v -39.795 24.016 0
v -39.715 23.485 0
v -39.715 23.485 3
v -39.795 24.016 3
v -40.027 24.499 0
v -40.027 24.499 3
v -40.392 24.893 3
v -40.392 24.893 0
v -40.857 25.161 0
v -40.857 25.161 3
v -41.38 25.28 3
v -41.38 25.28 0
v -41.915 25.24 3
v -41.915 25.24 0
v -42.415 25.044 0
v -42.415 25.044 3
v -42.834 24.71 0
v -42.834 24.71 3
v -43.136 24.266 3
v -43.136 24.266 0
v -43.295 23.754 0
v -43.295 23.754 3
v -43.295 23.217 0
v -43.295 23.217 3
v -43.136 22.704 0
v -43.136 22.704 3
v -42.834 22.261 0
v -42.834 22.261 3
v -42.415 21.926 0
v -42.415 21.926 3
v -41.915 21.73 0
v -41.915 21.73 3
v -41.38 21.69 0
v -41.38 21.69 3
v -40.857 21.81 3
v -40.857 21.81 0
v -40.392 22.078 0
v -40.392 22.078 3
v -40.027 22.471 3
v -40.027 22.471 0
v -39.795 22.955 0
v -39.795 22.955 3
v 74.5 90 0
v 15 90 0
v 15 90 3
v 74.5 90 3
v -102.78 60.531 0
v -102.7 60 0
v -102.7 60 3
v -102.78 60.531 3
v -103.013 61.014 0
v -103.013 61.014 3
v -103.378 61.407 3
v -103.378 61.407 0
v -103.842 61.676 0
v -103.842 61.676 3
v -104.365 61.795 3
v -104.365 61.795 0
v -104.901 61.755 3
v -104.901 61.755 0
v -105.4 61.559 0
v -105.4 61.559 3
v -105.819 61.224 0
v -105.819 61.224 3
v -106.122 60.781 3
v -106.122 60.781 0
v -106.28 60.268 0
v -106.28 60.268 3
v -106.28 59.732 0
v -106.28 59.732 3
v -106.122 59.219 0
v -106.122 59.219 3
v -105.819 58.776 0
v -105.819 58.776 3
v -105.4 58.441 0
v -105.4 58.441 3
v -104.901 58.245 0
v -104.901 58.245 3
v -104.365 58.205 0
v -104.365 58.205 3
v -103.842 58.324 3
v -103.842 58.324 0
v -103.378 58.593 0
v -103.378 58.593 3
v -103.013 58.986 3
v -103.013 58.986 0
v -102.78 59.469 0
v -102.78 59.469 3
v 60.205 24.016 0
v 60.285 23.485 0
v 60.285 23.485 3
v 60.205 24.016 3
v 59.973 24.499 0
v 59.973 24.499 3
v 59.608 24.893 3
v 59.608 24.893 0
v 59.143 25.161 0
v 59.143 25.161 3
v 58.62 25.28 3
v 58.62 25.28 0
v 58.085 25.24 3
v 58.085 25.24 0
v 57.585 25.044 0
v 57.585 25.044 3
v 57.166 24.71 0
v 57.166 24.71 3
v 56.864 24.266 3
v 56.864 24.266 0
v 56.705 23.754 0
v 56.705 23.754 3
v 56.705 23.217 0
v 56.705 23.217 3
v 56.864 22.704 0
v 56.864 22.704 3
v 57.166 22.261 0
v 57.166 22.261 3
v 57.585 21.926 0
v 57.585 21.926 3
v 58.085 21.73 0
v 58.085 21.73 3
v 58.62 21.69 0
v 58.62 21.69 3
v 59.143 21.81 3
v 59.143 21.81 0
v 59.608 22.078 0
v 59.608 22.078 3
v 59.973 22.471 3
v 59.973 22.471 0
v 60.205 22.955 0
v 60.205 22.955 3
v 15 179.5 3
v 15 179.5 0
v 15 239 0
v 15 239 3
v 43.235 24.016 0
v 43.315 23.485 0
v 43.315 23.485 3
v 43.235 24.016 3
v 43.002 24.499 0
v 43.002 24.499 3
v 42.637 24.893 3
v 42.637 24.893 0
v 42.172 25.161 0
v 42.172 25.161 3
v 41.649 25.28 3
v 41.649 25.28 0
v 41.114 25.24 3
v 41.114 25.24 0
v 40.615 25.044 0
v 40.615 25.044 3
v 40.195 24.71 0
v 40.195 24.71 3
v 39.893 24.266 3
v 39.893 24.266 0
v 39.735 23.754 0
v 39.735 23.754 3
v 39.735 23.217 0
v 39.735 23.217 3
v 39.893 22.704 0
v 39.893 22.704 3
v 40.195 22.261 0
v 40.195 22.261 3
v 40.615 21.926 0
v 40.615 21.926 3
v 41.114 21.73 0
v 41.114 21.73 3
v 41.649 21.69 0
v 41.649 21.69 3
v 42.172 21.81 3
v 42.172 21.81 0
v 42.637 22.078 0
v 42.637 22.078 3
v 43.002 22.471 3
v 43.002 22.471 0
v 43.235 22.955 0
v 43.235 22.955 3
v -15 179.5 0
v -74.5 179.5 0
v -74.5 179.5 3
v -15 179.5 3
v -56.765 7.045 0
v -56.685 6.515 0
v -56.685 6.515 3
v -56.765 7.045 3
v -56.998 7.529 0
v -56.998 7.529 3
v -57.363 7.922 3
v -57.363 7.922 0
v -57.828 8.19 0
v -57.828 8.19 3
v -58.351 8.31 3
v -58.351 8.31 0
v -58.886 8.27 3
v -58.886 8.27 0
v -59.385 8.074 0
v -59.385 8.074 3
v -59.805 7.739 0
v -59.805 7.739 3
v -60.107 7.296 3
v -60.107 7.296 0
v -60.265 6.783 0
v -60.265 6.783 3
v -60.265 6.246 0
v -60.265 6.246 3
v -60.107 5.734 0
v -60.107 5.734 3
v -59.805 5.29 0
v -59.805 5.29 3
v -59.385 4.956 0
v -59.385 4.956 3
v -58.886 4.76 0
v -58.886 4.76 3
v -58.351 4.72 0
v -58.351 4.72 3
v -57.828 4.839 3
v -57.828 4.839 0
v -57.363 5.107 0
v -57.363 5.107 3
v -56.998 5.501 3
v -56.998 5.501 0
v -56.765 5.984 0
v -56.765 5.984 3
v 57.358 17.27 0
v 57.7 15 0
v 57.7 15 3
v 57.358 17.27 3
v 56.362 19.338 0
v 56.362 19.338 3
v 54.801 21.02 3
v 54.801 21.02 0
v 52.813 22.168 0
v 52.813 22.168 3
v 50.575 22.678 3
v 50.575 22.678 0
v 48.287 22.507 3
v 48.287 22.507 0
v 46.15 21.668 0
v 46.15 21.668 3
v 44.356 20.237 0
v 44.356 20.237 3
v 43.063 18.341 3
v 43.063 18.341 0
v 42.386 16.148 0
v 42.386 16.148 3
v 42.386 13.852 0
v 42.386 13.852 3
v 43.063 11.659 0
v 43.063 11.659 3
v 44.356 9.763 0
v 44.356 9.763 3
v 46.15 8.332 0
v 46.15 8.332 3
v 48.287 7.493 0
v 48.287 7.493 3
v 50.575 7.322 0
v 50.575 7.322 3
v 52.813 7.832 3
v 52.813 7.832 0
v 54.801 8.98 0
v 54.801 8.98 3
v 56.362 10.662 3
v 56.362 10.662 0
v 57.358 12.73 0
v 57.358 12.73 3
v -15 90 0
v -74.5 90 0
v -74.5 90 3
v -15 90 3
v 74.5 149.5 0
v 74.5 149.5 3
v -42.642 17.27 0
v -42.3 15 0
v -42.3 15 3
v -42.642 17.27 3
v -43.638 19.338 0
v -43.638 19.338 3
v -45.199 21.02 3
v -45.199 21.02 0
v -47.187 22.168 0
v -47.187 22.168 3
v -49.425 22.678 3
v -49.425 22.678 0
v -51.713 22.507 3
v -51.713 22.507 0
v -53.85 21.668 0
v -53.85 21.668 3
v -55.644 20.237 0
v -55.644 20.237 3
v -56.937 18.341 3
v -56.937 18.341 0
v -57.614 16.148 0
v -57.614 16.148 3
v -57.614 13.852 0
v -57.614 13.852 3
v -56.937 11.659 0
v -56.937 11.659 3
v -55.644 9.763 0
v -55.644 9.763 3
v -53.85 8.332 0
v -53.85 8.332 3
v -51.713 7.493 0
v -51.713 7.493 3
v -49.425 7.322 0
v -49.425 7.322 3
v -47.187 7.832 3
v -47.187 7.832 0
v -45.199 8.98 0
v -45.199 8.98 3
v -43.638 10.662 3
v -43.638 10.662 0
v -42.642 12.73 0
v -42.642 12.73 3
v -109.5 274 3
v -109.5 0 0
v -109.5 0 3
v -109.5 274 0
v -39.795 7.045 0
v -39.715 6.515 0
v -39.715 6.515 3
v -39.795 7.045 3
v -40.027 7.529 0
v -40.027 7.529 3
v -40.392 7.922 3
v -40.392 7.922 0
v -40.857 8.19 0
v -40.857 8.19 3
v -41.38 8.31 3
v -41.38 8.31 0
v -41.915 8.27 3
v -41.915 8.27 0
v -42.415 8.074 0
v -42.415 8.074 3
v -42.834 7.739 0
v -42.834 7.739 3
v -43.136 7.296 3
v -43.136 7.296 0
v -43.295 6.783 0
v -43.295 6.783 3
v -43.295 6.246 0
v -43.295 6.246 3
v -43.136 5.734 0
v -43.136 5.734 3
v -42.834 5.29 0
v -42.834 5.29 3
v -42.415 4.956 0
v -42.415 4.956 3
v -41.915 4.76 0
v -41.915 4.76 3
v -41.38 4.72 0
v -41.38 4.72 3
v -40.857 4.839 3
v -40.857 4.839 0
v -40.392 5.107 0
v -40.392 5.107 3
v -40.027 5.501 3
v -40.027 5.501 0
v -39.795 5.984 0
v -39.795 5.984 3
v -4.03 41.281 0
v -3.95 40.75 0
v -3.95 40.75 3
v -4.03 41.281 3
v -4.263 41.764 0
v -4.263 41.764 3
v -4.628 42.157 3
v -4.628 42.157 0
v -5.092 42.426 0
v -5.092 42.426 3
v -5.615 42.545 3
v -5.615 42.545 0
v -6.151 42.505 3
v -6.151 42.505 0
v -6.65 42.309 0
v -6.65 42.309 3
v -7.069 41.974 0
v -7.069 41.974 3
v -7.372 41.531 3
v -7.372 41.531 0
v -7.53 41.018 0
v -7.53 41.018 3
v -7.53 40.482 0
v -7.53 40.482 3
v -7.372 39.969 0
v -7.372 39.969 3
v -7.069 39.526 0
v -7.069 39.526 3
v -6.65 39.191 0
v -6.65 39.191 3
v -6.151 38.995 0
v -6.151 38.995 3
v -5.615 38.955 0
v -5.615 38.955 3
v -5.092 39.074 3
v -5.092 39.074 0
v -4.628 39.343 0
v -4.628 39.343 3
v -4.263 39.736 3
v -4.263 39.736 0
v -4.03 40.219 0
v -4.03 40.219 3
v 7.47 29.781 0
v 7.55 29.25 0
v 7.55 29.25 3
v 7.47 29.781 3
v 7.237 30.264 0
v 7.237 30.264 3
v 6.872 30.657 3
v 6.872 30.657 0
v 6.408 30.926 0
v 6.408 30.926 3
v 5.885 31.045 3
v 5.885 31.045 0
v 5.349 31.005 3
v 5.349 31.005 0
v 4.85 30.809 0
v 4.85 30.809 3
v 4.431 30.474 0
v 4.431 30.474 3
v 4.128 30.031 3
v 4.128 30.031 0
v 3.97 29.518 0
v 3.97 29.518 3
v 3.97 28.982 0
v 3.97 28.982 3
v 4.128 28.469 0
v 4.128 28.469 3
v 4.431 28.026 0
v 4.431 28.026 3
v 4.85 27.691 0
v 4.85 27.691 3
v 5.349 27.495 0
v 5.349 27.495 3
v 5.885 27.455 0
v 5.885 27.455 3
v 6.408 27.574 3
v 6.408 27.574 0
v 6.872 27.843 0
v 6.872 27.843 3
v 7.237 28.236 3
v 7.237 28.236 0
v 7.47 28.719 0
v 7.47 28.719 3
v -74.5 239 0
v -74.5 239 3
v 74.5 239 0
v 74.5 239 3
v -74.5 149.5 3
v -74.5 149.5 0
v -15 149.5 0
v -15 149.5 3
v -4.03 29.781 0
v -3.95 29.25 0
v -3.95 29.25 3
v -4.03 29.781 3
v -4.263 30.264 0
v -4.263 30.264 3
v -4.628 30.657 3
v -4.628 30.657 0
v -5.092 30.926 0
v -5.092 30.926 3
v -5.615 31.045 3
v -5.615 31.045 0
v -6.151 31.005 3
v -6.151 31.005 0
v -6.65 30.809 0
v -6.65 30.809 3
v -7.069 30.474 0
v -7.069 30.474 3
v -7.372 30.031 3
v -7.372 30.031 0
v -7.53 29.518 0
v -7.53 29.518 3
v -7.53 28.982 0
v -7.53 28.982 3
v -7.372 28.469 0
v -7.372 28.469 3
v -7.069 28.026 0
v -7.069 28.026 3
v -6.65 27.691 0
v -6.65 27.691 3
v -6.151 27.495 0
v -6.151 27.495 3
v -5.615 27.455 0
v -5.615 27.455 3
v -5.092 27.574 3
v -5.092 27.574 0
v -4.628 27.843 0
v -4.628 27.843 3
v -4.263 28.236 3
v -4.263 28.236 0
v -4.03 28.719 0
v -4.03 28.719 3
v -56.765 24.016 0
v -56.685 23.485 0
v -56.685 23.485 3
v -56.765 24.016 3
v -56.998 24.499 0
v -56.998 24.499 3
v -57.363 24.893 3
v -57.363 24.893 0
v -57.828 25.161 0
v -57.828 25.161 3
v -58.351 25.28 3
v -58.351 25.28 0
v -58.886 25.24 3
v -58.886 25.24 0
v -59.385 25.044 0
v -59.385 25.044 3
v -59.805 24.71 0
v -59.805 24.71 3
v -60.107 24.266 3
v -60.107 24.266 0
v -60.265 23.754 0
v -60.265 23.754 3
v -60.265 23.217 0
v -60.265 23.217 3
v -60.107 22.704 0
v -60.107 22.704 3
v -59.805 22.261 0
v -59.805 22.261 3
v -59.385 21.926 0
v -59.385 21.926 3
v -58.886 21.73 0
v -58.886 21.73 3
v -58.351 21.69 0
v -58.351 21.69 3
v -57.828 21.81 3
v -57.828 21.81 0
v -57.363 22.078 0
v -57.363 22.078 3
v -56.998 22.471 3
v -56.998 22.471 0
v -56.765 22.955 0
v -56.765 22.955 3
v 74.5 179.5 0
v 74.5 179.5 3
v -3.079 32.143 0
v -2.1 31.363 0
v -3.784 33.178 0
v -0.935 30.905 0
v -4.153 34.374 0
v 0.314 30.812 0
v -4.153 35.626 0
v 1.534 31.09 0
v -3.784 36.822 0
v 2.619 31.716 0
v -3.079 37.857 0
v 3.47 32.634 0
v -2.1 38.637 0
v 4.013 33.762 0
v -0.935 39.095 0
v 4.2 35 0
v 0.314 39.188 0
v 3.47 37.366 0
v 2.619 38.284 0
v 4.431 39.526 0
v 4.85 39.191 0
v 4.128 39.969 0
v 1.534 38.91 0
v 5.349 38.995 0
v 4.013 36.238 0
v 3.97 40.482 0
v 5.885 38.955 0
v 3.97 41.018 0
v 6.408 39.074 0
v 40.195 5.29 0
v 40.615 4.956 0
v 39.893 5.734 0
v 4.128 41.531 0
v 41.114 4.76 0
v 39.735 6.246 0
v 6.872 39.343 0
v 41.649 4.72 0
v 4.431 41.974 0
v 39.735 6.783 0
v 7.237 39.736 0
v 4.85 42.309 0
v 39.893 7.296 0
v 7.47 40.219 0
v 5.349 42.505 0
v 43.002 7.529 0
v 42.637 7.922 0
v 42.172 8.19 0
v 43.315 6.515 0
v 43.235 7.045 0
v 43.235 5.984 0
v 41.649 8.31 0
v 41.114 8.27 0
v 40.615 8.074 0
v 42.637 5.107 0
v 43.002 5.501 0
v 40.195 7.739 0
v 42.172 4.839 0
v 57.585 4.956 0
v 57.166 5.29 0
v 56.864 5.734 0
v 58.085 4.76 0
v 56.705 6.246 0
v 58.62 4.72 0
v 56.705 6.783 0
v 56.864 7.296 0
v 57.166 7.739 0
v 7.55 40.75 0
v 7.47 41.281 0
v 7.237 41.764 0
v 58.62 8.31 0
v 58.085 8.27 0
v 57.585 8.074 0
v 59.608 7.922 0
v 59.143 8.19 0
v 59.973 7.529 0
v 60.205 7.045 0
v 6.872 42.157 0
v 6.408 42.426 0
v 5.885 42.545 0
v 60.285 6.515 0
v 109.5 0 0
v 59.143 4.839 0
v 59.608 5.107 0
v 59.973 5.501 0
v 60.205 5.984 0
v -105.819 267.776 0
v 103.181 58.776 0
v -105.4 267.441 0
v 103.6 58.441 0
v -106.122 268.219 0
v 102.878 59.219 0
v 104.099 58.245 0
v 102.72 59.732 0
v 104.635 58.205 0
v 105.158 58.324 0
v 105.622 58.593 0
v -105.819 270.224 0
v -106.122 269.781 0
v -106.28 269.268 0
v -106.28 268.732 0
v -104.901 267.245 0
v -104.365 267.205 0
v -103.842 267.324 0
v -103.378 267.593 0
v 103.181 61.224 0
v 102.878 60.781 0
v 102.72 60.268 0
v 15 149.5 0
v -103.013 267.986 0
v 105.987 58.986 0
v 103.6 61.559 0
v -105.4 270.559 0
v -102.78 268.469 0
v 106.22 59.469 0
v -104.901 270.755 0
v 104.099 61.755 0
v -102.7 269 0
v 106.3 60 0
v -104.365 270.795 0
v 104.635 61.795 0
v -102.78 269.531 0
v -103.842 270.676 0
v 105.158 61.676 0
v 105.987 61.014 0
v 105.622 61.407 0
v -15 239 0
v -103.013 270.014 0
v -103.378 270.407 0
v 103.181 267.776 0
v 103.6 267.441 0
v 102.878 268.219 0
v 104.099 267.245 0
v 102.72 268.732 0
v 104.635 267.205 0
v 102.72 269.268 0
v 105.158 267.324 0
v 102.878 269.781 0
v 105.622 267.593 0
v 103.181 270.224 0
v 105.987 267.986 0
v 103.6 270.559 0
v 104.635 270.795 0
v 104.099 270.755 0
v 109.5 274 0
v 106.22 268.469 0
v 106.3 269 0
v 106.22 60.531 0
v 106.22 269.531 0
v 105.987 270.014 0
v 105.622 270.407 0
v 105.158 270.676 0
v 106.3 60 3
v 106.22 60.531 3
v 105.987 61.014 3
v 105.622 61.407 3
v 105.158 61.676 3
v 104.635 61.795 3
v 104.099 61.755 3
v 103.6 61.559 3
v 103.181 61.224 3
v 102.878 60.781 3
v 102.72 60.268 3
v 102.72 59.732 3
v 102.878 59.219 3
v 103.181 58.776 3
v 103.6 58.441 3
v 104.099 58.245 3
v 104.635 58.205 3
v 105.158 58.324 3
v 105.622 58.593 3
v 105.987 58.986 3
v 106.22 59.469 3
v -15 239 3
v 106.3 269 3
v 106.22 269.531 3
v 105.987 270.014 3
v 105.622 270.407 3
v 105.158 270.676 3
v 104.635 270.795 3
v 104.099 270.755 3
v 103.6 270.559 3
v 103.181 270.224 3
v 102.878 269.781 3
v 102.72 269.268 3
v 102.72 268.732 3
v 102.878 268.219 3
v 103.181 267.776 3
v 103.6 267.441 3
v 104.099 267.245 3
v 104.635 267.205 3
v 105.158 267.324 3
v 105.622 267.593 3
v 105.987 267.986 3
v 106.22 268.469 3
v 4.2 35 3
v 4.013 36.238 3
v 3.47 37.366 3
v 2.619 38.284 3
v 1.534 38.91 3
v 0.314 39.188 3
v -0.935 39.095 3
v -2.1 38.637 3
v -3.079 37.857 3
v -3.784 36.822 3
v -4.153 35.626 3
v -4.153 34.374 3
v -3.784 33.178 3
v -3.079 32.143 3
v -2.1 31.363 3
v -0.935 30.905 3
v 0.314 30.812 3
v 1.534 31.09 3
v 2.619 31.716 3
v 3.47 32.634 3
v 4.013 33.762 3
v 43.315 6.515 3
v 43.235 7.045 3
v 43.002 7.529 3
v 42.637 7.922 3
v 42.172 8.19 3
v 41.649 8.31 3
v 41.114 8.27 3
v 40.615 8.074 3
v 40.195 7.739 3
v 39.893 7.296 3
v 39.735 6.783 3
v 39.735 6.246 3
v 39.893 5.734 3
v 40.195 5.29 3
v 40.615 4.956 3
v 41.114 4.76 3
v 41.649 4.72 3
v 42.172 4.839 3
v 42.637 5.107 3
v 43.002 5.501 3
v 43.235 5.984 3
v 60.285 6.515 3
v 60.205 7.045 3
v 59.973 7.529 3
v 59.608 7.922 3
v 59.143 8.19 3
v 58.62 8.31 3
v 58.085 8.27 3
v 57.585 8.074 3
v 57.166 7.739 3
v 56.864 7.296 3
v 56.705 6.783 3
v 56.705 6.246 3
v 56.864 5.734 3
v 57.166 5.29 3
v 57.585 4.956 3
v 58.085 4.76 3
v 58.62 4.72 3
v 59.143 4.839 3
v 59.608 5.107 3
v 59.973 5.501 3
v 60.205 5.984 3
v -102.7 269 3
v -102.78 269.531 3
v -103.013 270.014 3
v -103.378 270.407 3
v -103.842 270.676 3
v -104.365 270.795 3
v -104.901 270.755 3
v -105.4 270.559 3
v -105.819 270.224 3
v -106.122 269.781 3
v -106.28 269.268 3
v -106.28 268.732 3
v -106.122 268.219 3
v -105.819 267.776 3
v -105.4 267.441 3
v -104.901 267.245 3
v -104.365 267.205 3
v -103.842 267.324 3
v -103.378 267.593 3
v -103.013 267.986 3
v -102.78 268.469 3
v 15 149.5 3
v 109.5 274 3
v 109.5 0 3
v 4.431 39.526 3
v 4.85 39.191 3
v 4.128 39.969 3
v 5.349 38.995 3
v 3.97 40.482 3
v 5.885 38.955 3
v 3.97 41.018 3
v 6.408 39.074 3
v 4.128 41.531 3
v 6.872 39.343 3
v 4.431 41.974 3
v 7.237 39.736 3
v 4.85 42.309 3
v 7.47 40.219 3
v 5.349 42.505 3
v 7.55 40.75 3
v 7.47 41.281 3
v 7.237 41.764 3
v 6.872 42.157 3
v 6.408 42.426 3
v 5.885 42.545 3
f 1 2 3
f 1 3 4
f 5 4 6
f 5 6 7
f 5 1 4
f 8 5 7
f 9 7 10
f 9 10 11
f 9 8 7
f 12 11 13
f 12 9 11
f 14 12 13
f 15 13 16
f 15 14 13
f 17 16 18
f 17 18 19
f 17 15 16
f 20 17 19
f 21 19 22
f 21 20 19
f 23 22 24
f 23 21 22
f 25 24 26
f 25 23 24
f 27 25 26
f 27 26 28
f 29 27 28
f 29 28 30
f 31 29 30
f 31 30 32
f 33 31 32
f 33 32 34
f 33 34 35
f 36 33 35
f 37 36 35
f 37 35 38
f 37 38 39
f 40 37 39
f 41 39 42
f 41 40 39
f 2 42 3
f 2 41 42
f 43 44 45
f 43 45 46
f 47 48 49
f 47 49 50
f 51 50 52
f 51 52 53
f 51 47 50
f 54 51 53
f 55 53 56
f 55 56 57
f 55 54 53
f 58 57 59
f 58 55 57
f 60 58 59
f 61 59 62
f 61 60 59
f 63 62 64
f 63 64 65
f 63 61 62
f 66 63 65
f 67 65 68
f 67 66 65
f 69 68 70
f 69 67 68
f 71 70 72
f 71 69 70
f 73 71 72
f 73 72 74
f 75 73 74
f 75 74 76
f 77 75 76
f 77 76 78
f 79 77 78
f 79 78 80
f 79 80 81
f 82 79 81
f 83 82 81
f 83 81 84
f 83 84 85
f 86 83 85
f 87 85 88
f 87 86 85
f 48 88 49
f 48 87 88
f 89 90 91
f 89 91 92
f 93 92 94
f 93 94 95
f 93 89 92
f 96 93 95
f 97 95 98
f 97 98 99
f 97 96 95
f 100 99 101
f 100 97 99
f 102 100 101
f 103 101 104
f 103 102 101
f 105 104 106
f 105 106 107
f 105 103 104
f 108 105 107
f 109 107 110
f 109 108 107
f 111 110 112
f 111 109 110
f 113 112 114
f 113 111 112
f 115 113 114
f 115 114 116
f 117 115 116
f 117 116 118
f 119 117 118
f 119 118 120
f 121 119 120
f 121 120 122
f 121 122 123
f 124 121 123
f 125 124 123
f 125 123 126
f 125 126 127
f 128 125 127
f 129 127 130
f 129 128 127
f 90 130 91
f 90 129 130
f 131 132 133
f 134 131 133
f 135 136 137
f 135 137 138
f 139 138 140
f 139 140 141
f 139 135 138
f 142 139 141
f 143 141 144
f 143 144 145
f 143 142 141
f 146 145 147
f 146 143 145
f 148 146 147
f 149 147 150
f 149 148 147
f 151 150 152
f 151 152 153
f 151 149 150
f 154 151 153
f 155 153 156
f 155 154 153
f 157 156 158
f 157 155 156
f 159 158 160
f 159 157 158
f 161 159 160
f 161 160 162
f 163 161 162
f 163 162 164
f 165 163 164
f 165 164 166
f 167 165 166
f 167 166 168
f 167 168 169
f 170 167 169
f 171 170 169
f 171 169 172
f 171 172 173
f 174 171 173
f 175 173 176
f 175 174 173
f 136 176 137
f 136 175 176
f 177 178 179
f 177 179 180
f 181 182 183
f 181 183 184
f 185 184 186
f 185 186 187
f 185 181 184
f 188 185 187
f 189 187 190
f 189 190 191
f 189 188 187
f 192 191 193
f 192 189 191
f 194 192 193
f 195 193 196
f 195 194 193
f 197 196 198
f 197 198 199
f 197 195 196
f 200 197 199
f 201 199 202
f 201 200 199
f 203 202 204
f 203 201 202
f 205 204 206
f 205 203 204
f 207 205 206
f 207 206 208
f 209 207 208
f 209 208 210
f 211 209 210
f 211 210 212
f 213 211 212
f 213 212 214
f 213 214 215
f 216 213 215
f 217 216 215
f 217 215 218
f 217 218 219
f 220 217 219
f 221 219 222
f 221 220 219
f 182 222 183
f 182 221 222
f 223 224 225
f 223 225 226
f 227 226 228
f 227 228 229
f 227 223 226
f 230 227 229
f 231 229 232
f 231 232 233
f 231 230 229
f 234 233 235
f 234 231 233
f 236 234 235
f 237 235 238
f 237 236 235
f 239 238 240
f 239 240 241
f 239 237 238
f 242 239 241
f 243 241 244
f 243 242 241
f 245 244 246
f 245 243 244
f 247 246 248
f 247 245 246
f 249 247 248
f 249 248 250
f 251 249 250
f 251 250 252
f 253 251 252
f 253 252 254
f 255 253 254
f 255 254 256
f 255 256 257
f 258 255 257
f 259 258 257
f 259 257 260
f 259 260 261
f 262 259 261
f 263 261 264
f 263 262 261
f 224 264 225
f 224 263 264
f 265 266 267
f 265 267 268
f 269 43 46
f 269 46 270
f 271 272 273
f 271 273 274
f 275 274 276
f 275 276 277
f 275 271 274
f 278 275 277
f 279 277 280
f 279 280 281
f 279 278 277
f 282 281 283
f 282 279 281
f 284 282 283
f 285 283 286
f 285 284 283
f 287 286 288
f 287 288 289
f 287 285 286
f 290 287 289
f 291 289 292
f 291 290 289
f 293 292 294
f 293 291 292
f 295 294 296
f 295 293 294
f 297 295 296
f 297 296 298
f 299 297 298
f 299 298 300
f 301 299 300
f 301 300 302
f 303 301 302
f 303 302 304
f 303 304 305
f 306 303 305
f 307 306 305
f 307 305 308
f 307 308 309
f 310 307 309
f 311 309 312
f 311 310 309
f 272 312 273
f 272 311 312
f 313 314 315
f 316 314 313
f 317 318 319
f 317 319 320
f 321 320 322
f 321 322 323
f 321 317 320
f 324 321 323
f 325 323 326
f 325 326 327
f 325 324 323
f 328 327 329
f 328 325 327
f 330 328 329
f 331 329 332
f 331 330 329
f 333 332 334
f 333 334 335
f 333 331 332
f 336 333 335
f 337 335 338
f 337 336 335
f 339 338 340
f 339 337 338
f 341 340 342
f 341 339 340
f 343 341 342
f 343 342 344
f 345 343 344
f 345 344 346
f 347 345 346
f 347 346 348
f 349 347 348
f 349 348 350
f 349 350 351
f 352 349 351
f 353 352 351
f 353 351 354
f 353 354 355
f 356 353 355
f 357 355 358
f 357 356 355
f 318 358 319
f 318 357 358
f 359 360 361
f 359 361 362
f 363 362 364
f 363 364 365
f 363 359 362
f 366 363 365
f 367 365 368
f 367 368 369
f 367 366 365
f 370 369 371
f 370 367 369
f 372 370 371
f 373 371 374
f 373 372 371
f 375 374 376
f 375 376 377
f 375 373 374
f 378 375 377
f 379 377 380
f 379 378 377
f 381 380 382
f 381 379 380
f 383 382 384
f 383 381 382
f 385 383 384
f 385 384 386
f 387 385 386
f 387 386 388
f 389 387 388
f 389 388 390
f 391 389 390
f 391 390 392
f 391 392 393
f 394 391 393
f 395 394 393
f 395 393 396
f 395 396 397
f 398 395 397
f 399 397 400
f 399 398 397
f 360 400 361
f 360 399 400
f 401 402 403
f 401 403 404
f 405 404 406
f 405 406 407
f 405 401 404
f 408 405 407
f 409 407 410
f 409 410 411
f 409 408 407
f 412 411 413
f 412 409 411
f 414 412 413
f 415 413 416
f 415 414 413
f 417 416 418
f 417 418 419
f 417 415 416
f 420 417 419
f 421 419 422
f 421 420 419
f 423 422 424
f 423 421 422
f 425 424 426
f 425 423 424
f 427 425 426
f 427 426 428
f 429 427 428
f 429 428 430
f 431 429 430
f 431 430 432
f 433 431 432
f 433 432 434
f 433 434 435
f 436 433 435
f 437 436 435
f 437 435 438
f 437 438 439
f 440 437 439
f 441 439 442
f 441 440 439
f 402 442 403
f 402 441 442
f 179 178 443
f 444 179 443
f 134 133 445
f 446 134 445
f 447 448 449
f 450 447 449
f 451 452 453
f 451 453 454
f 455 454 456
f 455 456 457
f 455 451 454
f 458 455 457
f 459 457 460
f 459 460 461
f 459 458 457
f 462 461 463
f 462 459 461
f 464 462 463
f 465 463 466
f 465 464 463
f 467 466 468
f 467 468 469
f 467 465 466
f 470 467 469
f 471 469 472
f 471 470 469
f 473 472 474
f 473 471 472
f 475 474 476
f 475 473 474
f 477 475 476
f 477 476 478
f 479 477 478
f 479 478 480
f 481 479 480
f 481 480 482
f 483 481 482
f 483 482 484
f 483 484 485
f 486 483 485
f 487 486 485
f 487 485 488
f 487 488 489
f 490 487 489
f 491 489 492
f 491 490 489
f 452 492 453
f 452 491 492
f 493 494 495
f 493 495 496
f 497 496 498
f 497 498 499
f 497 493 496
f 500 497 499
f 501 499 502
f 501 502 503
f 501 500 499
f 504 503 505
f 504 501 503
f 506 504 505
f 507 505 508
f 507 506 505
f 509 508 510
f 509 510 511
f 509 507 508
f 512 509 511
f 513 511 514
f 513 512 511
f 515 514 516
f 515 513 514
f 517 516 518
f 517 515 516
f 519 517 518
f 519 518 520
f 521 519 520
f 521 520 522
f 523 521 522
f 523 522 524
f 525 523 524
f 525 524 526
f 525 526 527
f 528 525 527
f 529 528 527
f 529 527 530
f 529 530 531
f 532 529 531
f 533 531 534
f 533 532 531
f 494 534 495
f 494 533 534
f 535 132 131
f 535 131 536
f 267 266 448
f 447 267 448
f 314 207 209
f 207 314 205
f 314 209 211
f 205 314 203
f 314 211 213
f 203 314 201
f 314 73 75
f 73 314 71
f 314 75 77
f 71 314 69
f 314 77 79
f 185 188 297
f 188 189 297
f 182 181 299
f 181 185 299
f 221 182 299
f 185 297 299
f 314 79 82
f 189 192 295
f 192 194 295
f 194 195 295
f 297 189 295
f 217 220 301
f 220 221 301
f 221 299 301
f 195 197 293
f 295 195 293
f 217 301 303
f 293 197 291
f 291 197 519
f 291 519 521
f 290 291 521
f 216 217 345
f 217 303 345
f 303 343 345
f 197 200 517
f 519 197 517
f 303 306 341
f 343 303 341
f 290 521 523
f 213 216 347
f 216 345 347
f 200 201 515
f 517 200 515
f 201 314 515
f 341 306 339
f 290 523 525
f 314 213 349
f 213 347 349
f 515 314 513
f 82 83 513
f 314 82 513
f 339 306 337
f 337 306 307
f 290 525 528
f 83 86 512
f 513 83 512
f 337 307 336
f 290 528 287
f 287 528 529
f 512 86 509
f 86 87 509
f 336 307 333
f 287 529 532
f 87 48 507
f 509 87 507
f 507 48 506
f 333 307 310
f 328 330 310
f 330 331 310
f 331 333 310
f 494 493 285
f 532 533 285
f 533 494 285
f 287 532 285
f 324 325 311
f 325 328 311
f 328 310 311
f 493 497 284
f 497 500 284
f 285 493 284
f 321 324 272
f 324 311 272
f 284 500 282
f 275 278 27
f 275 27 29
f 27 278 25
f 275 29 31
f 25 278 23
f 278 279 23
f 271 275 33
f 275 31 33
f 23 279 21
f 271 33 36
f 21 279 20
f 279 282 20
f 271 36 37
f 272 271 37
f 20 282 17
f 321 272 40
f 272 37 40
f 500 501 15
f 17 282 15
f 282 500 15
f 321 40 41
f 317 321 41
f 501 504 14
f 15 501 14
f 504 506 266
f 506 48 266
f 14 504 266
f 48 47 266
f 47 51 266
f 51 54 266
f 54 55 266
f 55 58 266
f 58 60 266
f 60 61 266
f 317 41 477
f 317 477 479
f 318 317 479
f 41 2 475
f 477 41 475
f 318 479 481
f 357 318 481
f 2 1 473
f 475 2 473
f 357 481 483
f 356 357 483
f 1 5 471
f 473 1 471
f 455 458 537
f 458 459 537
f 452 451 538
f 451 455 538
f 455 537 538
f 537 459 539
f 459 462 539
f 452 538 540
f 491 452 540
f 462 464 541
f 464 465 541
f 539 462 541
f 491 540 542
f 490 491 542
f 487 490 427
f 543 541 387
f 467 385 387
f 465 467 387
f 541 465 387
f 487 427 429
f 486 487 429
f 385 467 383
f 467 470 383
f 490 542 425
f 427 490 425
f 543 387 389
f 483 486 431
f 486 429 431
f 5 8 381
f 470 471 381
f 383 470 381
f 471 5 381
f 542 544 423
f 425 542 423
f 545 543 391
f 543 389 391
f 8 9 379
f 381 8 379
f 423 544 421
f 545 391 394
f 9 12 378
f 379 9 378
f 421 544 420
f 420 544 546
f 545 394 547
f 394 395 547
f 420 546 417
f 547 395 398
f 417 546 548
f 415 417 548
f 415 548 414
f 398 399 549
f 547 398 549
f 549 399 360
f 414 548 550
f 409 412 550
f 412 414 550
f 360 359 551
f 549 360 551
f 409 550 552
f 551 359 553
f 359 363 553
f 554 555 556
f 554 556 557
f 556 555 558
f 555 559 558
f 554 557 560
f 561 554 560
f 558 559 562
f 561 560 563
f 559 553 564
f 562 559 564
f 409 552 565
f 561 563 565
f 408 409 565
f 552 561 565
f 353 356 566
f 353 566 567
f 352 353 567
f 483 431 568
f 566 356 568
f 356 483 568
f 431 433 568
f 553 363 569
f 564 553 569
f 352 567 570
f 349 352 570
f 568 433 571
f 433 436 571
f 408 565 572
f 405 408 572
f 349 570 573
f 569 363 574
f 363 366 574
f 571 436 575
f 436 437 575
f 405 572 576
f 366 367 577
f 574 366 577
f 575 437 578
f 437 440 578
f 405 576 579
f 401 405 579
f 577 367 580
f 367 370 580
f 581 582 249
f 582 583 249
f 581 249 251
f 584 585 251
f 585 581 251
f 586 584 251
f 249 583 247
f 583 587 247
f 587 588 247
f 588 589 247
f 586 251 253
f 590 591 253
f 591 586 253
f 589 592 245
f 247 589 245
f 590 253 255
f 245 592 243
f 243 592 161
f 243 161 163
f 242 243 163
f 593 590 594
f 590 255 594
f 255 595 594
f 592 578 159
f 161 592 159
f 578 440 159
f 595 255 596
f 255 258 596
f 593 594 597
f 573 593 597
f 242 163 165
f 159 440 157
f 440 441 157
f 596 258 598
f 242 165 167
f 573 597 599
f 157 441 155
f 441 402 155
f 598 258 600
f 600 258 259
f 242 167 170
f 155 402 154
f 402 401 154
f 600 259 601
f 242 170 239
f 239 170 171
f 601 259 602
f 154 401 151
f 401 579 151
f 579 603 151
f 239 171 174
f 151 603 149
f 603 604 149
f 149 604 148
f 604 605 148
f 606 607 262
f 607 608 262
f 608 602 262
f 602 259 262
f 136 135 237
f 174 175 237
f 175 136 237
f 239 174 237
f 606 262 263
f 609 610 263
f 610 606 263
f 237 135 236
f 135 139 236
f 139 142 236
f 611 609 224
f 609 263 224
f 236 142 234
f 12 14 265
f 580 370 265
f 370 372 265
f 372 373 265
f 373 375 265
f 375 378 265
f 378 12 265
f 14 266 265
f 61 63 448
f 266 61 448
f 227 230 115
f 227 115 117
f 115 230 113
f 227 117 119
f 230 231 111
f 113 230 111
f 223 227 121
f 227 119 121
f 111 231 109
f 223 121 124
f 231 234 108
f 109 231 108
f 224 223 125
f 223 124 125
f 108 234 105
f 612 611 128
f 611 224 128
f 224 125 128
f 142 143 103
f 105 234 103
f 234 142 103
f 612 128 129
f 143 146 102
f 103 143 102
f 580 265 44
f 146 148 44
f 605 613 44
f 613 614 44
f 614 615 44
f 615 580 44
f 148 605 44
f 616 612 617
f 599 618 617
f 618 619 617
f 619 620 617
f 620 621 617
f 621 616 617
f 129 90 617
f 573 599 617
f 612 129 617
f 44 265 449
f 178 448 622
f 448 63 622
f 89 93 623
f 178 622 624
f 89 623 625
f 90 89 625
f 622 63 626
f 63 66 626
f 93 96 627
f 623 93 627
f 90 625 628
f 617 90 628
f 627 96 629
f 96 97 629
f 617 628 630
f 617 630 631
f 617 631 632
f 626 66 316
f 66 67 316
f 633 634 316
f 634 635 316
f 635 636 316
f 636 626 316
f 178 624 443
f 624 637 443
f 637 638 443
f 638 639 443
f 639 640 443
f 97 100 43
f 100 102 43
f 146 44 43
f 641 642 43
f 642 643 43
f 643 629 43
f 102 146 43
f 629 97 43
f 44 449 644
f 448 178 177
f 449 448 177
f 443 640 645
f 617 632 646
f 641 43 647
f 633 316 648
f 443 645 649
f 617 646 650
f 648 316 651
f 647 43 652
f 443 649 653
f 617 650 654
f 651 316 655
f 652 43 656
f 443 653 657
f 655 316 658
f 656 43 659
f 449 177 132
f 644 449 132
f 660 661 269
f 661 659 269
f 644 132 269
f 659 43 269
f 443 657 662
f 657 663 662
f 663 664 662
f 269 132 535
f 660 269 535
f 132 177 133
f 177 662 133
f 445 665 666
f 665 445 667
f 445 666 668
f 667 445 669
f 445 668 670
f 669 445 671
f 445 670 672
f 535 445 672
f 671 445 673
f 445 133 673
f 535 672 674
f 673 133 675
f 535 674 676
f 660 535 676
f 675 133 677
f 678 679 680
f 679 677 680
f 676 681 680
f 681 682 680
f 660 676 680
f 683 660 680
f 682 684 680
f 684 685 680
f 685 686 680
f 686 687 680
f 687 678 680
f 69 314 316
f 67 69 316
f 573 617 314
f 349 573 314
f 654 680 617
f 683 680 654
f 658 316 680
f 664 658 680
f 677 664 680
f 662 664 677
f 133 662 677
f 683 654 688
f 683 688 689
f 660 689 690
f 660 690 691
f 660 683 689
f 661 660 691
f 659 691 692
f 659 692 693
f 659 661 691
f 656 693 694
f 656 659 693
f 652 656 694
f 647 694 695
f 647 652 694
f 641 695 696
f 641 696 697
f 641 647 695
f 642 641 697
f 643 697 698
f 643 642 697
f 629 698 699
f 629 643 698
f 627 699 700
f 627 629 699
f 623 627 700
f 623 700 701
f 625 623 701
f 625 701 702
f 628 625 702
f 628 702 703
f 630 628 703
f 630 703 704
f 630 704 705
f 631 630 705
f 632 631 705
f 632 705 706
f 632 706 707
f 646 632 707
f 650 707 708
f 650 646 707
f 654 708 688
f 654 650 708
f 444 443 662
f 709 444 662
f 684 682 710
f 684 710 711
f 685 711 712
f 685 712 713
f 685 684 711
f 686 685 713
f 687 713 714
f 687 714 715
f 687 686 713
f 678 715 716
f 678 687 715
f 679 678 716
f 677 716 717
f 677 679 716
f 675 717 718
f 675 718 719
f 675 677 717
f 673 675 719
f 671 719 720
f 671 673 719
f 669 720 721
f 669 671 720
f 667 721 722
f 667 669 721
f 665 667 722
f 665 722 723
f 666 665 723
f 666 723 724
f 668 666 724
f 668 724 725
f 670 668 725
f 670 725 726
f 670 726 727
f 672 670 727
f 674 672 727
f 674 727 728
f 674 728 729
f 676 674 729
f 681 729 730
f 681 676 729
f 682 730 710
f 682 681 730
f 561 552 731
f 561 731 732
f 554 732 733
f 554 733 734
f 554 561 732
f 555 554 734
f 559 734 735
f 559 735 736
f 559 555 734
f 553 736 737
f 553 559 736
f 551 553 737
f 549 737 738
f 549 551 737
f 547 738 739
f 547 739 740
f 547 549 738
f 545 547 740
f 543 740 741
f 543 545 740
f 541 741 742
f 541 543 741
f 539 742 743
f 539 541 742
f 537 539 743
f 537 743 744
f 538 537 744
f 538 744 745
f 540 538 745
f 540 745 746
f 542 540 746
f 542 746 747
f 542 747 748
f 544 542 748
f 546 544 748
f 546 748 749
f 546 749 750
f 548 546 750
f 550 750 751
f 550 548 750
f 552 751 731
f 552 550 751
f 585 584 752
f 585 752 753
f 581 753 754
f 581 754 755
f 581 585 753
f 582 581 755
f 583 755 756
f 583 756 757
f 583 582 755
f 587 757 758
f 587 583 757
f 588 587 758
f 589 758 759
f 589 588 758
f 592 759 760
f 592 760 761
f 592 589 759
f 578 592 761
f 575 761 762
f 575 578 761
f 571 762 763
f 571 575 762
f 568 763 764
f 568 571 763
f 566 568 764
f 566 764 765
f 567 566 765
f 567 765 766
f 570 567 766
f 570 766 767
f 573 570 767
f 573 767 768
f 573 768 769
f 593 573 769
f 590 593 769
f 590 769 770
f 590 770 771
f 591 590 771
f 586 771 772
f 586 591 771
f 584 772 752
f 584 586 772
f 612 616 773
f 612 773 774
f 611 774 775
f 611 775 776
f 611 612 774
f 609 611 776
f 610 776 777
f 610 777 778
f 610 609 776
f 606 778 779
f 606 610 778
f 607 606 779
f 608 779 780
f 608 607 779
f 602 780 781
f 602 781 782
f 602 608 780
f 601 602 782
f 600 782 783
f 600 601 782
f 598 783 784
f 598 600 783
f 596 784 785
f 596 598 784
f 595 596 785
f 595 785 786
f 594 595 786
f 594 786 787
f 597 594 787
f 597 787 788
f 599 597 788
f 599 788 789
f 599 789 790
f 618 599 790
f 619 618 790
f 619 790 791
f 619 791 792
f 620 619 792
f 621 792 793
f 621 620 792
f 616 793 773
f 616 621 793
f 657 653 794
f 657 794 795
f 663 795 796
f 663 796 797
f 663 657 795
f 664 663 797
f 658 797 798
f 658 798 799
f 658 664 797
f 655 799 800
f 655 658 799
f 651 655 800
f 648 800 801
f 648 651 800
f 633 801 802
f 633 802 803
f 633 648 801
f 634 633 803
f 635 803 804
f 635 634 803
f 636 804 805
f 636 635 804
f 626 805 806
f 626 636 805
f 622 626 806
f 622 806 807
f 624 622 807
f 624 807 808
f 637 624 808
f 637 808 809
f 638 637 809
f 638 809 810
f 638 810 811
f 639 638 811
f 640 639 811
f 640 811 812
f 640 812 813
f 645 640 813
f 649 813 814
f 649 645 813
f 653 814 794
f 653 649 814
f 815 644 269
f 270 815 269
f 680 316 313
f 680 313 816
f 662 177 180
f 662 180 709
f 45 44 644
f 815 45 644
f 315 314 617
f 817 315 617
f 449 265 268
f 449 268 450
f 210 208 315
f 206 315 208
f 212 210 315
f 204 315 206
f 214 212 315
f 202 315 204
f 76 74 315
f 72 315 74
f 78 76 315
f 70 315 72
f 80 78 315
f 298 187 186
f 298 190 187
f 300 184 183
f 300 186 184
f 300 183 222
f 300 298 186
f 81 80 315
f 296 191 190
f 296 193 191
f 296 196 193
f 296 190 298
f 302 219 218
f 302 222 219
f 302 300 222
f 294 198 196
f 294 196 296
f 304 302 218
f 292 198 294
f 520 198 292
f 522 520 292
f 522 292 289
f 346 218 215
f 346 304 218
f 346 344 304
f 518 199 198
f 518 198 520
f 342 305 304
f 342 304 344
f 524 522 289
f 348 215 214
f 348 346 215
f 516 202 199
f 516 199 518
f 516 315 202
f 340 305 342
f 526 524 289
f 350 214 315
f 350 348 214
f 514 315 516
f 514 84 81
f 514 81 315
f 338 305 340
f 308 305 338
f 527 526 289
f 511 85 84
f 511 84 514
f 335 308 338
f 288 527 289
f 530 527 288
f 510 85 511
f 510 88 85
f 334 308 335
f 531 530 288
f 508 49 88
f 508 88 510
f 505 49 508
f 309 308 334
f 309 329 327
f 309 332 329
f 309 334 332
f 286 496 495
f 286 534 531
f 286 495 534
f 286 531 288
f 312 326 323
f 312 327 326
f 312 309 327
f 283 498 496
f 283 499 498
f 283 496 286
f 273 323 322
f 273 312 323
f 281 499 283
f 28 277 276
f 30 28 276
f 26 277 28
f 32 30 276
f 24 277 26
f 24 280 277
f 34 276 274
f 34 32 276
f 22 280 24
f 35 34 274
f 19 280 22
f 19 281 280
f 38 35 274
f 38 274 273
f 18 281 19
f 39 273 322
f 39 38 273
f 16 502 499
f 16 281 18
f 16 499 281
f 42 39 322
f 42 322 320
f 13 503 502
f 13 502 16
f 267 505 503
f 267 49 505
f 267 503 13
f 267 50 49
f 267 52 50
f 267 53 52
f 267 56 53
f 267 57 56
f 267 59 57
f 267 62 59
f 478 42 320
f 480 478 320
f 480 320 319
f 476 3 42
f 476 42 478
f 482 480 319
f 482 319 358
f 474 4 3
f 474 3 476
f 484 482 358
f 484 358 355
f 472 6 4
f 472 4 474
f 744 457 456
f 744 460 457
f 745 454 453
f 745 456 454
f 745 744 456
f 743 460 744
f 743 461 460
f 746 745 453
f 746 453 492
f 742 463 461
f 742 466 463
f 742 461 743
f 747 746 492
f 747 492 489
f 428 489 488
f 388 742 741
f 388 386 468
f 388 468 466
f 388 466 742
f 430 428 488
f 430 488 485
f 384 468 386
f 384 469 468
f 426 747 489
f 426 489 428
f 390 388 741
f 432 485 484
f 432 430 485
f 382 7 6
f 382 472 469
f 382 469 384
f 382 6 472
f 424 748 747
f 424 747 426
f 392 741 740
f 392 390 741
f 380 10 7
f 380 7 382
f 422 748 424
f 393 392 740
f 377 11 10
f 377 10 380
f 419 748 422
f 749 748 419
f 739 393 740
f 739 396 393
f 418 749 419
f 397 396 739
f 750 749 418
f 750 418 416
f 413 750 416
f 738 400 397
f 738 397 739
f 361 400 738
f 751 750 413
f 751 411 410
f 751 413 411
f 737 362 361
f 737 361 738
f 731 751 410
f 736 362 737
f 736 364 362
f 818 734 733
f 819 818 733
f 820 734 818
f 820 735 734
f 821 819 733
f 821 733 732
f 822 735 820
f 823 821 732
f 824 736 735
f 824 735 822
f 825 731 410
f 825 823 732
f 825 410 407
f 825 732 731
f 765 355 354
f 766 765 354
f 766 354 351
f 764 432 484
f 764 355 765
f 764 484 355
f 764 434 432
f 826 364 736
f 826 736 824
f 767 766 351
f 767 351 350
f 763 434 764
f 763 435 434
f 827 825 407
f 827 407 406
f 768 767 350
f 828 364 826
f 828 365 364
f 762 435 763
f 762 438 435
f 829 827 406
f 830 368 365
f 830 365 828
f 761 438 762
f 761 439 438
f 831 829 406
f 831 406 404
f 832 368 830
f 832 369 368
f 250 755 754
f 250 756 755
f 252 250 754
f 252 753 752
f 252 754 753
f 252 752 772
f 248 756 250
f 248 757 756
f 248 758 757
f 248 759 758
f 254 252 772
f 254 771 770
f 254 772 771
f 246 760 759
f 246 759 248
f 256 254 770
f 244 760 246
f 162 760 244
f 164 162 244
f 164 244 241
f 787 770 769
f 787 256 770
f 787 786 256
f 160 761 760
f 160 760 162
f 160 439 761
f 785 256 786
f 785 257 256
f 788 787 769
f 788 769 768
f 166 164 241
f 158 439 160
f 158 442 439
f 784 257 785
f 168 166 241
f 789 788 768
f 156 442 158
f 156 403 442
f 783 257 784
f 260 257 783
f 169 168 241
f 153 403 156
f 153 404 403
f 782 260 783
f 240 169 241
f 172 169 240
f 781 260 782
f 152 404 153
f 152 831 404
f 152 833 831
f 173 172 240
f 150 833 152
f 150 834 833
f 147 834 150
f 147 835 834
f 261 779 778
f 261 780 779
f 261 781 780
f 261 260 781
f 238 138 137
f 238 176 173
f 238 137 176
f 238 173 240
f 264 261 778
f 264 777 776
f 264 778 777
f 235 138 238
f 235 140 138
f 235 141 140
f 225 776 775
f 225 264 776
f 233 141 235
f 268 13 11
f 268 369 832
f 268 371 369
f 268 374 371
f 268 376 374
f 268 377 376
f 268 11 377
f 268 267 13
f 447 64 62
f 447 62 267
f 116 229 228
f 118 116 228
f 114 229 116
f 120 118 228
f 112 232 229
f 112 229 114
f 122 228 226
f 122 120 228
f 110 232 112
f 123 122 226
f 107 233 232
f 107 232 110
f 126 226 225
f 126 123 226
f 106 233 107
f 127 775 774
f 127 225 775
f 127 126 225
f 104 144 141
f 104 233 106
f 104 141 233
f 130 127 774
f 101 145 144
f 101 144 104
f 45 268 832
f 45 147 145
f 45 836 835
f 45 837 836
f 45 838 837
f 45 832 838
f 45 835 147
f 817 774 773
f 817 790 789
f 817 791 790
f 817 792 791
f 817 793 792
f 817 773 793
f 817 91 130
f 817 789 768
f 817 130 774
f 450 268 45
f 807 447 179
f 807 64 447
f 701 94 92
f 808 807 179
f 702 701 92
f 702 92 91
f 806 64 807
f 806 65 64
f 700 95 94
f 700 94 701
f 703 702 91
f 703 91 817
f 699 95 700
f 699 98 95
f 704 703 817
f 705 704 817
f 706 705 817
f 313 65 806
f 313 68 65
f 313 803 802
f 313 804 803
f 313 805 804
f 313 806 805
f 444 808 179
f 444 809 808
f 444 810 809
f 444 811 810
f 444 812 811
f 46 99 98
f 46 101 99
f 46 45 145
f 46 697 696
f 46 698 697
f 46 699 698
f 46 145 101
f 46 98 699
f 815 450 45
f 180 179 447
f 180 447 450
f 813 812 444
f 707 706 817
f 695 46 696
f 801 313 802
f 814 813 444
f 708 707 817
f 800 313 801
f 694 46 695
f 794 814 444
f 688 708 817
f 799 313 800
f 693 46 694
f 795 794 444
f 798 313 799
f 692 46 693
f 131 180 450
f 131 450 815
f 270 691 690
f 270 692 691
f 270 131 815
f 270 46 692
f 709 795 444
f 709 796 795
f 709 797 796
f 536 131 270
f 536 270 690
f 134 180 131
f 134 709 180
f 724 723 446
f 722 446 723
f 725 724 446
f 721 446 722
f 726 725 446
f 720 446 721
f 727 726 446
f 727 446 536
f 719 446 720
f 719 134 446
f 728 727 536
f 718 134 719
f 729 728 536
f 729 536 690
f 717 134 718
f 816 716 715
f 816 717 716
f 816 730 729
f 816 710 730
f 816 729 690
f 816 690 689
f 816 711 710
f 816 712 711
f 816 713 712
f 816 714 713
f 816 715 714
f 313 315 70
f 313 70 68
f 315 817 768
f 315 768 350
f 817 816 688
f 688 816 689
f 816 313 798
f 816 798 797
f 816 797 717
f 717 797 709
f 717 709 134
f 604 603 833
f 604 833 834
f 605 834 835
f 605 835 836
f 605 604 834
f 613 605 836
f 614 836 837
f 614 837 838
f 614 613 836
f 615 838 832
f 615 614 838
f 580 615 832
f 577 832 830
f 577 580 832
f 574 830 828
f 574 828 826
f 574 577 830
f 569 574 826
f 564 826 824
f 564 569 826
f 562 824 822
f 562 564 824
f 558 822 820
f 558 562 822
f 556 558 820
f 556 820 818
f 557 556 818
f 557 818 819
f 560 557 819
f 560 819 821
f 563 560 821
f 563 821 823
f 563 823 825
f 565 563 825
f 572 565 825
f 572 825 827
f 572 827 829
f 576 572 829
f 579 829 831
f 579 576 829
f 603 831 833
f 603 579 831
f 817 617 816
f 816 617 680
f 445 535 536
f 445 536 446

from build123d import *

# Parameters (mm, degrees)
SKETCH_W   = 219
SKETCH_H   = 274
SKETCH_R   = 1.8
SKETCH_R_2 = 4.2
SKETCH_R_3 = 7.7
SKETCH_W_2 = 59.5
SKETCH_H_2 = 59.5
PAD_DEPTH  = 3


with BuildPart() as part:
    # Sketch → Pad (new body)
    with BuildSketch(Plane.XY):
        with Locations((0, 137)):
            Rectangle(SKETCH_W, SKETCH_H)
        with Locations((-104.5, 60)):
            Circle(SKETCH_R, mode=Mode.SUBTRACT)
        with Locations((104.5, 60)):
            Circle(SKETCH_R, mode=Mode.SUBTRACT)
        with Locations((-104.5, 269)):
            Circle(SKETCH_R, mode=Mode.SUBTRACT)
        with Locations((104.5, 269)):
            Circle(SKETCH_R, mode=Mode.SUBTRACT)
        with Locations((0, 35)):
            Circle(SKETCH_R_2, mode=Mode.SUBTRACT)
        with Locations((5.75, 29.25)):
            Circle(SKETCH_R, mode=Mode.SUBTRACT)
        with Locations((5.75, 40.75)):
            Circle(SKETCH_R, mode=Mode.SUBTRACT)
        with Locations((-5.75, 29.25)):
            Circle(SKETCH_R, mode=Mode.SUBTRACT)
        with Locations((-5.75, 40.75)):
            Circle(SKETCH_R, mode=Mode.SUBTRACT)
        with Locations((-58.485281, 23.485281)):
            Circle(SKETCH_R, mode=Mode.SUBTRACT)
        with Locations((-41.514719, 23.485281)):
            Circle(SKETCH_R, mode=Mode.SUBTRACT)
        with Locations((-41.514719, 6.514719)):
            Circle(SKETCH_R, mode=Mode.SUBTRACT)
        with Locations((-58.485281, 6.514719)):
            Circle(SKETCH_R, mode=Mode.SUBTRACT)
        with Locations((-50, 15)):
            Circle(SKETCH_R_3, mode=Mode.SUBTRACT)
        with Locations((41.514719, 23.485281)):
            Circle(SKETCH_R, mode=Mode.SUBTRACT)
        with Locations((58.485281, 23.485281)):
            Circle(SKETCH_R, mode=Mode.SUBTRACT)
        with Locations((58.485281, 6.514719)):
            Circle(SKETCH_R, mode=Mode.SUBTRACT)
        with Locations((41.514719, 6.514719)):
            Circle(SKETCH_R, mode=Mode.SUBTRACT)
        with Locations((50, 15)):
            Circle(SKETCH_R_3, mode=Mode.SUBTRACT)
        with Locations((-44.75, 209.25)):
            Rectangle(SKETCH_W_2, SKETCH_H_2, mode=Mode.SUBTRACT)
        with Locations((44.75, 209.25)):
            Rectangle(SKETCH_W_2, SKETCH_H_2, mode=Mode.SUBTRACT)
        with Locations((44.75, 119.75)):
            Rectangle(SKETCH_W_2, SKETCH_H_2, mode=Mode.SUBTRACT)
        with Locations((-44.75, 119.75)):
            Rectangle(SKETCH_W_2, SKETCH_H_2, mode=Mode.SUBTRACT)
    extrude(amount=PAD_DEPTH)


solid = part.part
